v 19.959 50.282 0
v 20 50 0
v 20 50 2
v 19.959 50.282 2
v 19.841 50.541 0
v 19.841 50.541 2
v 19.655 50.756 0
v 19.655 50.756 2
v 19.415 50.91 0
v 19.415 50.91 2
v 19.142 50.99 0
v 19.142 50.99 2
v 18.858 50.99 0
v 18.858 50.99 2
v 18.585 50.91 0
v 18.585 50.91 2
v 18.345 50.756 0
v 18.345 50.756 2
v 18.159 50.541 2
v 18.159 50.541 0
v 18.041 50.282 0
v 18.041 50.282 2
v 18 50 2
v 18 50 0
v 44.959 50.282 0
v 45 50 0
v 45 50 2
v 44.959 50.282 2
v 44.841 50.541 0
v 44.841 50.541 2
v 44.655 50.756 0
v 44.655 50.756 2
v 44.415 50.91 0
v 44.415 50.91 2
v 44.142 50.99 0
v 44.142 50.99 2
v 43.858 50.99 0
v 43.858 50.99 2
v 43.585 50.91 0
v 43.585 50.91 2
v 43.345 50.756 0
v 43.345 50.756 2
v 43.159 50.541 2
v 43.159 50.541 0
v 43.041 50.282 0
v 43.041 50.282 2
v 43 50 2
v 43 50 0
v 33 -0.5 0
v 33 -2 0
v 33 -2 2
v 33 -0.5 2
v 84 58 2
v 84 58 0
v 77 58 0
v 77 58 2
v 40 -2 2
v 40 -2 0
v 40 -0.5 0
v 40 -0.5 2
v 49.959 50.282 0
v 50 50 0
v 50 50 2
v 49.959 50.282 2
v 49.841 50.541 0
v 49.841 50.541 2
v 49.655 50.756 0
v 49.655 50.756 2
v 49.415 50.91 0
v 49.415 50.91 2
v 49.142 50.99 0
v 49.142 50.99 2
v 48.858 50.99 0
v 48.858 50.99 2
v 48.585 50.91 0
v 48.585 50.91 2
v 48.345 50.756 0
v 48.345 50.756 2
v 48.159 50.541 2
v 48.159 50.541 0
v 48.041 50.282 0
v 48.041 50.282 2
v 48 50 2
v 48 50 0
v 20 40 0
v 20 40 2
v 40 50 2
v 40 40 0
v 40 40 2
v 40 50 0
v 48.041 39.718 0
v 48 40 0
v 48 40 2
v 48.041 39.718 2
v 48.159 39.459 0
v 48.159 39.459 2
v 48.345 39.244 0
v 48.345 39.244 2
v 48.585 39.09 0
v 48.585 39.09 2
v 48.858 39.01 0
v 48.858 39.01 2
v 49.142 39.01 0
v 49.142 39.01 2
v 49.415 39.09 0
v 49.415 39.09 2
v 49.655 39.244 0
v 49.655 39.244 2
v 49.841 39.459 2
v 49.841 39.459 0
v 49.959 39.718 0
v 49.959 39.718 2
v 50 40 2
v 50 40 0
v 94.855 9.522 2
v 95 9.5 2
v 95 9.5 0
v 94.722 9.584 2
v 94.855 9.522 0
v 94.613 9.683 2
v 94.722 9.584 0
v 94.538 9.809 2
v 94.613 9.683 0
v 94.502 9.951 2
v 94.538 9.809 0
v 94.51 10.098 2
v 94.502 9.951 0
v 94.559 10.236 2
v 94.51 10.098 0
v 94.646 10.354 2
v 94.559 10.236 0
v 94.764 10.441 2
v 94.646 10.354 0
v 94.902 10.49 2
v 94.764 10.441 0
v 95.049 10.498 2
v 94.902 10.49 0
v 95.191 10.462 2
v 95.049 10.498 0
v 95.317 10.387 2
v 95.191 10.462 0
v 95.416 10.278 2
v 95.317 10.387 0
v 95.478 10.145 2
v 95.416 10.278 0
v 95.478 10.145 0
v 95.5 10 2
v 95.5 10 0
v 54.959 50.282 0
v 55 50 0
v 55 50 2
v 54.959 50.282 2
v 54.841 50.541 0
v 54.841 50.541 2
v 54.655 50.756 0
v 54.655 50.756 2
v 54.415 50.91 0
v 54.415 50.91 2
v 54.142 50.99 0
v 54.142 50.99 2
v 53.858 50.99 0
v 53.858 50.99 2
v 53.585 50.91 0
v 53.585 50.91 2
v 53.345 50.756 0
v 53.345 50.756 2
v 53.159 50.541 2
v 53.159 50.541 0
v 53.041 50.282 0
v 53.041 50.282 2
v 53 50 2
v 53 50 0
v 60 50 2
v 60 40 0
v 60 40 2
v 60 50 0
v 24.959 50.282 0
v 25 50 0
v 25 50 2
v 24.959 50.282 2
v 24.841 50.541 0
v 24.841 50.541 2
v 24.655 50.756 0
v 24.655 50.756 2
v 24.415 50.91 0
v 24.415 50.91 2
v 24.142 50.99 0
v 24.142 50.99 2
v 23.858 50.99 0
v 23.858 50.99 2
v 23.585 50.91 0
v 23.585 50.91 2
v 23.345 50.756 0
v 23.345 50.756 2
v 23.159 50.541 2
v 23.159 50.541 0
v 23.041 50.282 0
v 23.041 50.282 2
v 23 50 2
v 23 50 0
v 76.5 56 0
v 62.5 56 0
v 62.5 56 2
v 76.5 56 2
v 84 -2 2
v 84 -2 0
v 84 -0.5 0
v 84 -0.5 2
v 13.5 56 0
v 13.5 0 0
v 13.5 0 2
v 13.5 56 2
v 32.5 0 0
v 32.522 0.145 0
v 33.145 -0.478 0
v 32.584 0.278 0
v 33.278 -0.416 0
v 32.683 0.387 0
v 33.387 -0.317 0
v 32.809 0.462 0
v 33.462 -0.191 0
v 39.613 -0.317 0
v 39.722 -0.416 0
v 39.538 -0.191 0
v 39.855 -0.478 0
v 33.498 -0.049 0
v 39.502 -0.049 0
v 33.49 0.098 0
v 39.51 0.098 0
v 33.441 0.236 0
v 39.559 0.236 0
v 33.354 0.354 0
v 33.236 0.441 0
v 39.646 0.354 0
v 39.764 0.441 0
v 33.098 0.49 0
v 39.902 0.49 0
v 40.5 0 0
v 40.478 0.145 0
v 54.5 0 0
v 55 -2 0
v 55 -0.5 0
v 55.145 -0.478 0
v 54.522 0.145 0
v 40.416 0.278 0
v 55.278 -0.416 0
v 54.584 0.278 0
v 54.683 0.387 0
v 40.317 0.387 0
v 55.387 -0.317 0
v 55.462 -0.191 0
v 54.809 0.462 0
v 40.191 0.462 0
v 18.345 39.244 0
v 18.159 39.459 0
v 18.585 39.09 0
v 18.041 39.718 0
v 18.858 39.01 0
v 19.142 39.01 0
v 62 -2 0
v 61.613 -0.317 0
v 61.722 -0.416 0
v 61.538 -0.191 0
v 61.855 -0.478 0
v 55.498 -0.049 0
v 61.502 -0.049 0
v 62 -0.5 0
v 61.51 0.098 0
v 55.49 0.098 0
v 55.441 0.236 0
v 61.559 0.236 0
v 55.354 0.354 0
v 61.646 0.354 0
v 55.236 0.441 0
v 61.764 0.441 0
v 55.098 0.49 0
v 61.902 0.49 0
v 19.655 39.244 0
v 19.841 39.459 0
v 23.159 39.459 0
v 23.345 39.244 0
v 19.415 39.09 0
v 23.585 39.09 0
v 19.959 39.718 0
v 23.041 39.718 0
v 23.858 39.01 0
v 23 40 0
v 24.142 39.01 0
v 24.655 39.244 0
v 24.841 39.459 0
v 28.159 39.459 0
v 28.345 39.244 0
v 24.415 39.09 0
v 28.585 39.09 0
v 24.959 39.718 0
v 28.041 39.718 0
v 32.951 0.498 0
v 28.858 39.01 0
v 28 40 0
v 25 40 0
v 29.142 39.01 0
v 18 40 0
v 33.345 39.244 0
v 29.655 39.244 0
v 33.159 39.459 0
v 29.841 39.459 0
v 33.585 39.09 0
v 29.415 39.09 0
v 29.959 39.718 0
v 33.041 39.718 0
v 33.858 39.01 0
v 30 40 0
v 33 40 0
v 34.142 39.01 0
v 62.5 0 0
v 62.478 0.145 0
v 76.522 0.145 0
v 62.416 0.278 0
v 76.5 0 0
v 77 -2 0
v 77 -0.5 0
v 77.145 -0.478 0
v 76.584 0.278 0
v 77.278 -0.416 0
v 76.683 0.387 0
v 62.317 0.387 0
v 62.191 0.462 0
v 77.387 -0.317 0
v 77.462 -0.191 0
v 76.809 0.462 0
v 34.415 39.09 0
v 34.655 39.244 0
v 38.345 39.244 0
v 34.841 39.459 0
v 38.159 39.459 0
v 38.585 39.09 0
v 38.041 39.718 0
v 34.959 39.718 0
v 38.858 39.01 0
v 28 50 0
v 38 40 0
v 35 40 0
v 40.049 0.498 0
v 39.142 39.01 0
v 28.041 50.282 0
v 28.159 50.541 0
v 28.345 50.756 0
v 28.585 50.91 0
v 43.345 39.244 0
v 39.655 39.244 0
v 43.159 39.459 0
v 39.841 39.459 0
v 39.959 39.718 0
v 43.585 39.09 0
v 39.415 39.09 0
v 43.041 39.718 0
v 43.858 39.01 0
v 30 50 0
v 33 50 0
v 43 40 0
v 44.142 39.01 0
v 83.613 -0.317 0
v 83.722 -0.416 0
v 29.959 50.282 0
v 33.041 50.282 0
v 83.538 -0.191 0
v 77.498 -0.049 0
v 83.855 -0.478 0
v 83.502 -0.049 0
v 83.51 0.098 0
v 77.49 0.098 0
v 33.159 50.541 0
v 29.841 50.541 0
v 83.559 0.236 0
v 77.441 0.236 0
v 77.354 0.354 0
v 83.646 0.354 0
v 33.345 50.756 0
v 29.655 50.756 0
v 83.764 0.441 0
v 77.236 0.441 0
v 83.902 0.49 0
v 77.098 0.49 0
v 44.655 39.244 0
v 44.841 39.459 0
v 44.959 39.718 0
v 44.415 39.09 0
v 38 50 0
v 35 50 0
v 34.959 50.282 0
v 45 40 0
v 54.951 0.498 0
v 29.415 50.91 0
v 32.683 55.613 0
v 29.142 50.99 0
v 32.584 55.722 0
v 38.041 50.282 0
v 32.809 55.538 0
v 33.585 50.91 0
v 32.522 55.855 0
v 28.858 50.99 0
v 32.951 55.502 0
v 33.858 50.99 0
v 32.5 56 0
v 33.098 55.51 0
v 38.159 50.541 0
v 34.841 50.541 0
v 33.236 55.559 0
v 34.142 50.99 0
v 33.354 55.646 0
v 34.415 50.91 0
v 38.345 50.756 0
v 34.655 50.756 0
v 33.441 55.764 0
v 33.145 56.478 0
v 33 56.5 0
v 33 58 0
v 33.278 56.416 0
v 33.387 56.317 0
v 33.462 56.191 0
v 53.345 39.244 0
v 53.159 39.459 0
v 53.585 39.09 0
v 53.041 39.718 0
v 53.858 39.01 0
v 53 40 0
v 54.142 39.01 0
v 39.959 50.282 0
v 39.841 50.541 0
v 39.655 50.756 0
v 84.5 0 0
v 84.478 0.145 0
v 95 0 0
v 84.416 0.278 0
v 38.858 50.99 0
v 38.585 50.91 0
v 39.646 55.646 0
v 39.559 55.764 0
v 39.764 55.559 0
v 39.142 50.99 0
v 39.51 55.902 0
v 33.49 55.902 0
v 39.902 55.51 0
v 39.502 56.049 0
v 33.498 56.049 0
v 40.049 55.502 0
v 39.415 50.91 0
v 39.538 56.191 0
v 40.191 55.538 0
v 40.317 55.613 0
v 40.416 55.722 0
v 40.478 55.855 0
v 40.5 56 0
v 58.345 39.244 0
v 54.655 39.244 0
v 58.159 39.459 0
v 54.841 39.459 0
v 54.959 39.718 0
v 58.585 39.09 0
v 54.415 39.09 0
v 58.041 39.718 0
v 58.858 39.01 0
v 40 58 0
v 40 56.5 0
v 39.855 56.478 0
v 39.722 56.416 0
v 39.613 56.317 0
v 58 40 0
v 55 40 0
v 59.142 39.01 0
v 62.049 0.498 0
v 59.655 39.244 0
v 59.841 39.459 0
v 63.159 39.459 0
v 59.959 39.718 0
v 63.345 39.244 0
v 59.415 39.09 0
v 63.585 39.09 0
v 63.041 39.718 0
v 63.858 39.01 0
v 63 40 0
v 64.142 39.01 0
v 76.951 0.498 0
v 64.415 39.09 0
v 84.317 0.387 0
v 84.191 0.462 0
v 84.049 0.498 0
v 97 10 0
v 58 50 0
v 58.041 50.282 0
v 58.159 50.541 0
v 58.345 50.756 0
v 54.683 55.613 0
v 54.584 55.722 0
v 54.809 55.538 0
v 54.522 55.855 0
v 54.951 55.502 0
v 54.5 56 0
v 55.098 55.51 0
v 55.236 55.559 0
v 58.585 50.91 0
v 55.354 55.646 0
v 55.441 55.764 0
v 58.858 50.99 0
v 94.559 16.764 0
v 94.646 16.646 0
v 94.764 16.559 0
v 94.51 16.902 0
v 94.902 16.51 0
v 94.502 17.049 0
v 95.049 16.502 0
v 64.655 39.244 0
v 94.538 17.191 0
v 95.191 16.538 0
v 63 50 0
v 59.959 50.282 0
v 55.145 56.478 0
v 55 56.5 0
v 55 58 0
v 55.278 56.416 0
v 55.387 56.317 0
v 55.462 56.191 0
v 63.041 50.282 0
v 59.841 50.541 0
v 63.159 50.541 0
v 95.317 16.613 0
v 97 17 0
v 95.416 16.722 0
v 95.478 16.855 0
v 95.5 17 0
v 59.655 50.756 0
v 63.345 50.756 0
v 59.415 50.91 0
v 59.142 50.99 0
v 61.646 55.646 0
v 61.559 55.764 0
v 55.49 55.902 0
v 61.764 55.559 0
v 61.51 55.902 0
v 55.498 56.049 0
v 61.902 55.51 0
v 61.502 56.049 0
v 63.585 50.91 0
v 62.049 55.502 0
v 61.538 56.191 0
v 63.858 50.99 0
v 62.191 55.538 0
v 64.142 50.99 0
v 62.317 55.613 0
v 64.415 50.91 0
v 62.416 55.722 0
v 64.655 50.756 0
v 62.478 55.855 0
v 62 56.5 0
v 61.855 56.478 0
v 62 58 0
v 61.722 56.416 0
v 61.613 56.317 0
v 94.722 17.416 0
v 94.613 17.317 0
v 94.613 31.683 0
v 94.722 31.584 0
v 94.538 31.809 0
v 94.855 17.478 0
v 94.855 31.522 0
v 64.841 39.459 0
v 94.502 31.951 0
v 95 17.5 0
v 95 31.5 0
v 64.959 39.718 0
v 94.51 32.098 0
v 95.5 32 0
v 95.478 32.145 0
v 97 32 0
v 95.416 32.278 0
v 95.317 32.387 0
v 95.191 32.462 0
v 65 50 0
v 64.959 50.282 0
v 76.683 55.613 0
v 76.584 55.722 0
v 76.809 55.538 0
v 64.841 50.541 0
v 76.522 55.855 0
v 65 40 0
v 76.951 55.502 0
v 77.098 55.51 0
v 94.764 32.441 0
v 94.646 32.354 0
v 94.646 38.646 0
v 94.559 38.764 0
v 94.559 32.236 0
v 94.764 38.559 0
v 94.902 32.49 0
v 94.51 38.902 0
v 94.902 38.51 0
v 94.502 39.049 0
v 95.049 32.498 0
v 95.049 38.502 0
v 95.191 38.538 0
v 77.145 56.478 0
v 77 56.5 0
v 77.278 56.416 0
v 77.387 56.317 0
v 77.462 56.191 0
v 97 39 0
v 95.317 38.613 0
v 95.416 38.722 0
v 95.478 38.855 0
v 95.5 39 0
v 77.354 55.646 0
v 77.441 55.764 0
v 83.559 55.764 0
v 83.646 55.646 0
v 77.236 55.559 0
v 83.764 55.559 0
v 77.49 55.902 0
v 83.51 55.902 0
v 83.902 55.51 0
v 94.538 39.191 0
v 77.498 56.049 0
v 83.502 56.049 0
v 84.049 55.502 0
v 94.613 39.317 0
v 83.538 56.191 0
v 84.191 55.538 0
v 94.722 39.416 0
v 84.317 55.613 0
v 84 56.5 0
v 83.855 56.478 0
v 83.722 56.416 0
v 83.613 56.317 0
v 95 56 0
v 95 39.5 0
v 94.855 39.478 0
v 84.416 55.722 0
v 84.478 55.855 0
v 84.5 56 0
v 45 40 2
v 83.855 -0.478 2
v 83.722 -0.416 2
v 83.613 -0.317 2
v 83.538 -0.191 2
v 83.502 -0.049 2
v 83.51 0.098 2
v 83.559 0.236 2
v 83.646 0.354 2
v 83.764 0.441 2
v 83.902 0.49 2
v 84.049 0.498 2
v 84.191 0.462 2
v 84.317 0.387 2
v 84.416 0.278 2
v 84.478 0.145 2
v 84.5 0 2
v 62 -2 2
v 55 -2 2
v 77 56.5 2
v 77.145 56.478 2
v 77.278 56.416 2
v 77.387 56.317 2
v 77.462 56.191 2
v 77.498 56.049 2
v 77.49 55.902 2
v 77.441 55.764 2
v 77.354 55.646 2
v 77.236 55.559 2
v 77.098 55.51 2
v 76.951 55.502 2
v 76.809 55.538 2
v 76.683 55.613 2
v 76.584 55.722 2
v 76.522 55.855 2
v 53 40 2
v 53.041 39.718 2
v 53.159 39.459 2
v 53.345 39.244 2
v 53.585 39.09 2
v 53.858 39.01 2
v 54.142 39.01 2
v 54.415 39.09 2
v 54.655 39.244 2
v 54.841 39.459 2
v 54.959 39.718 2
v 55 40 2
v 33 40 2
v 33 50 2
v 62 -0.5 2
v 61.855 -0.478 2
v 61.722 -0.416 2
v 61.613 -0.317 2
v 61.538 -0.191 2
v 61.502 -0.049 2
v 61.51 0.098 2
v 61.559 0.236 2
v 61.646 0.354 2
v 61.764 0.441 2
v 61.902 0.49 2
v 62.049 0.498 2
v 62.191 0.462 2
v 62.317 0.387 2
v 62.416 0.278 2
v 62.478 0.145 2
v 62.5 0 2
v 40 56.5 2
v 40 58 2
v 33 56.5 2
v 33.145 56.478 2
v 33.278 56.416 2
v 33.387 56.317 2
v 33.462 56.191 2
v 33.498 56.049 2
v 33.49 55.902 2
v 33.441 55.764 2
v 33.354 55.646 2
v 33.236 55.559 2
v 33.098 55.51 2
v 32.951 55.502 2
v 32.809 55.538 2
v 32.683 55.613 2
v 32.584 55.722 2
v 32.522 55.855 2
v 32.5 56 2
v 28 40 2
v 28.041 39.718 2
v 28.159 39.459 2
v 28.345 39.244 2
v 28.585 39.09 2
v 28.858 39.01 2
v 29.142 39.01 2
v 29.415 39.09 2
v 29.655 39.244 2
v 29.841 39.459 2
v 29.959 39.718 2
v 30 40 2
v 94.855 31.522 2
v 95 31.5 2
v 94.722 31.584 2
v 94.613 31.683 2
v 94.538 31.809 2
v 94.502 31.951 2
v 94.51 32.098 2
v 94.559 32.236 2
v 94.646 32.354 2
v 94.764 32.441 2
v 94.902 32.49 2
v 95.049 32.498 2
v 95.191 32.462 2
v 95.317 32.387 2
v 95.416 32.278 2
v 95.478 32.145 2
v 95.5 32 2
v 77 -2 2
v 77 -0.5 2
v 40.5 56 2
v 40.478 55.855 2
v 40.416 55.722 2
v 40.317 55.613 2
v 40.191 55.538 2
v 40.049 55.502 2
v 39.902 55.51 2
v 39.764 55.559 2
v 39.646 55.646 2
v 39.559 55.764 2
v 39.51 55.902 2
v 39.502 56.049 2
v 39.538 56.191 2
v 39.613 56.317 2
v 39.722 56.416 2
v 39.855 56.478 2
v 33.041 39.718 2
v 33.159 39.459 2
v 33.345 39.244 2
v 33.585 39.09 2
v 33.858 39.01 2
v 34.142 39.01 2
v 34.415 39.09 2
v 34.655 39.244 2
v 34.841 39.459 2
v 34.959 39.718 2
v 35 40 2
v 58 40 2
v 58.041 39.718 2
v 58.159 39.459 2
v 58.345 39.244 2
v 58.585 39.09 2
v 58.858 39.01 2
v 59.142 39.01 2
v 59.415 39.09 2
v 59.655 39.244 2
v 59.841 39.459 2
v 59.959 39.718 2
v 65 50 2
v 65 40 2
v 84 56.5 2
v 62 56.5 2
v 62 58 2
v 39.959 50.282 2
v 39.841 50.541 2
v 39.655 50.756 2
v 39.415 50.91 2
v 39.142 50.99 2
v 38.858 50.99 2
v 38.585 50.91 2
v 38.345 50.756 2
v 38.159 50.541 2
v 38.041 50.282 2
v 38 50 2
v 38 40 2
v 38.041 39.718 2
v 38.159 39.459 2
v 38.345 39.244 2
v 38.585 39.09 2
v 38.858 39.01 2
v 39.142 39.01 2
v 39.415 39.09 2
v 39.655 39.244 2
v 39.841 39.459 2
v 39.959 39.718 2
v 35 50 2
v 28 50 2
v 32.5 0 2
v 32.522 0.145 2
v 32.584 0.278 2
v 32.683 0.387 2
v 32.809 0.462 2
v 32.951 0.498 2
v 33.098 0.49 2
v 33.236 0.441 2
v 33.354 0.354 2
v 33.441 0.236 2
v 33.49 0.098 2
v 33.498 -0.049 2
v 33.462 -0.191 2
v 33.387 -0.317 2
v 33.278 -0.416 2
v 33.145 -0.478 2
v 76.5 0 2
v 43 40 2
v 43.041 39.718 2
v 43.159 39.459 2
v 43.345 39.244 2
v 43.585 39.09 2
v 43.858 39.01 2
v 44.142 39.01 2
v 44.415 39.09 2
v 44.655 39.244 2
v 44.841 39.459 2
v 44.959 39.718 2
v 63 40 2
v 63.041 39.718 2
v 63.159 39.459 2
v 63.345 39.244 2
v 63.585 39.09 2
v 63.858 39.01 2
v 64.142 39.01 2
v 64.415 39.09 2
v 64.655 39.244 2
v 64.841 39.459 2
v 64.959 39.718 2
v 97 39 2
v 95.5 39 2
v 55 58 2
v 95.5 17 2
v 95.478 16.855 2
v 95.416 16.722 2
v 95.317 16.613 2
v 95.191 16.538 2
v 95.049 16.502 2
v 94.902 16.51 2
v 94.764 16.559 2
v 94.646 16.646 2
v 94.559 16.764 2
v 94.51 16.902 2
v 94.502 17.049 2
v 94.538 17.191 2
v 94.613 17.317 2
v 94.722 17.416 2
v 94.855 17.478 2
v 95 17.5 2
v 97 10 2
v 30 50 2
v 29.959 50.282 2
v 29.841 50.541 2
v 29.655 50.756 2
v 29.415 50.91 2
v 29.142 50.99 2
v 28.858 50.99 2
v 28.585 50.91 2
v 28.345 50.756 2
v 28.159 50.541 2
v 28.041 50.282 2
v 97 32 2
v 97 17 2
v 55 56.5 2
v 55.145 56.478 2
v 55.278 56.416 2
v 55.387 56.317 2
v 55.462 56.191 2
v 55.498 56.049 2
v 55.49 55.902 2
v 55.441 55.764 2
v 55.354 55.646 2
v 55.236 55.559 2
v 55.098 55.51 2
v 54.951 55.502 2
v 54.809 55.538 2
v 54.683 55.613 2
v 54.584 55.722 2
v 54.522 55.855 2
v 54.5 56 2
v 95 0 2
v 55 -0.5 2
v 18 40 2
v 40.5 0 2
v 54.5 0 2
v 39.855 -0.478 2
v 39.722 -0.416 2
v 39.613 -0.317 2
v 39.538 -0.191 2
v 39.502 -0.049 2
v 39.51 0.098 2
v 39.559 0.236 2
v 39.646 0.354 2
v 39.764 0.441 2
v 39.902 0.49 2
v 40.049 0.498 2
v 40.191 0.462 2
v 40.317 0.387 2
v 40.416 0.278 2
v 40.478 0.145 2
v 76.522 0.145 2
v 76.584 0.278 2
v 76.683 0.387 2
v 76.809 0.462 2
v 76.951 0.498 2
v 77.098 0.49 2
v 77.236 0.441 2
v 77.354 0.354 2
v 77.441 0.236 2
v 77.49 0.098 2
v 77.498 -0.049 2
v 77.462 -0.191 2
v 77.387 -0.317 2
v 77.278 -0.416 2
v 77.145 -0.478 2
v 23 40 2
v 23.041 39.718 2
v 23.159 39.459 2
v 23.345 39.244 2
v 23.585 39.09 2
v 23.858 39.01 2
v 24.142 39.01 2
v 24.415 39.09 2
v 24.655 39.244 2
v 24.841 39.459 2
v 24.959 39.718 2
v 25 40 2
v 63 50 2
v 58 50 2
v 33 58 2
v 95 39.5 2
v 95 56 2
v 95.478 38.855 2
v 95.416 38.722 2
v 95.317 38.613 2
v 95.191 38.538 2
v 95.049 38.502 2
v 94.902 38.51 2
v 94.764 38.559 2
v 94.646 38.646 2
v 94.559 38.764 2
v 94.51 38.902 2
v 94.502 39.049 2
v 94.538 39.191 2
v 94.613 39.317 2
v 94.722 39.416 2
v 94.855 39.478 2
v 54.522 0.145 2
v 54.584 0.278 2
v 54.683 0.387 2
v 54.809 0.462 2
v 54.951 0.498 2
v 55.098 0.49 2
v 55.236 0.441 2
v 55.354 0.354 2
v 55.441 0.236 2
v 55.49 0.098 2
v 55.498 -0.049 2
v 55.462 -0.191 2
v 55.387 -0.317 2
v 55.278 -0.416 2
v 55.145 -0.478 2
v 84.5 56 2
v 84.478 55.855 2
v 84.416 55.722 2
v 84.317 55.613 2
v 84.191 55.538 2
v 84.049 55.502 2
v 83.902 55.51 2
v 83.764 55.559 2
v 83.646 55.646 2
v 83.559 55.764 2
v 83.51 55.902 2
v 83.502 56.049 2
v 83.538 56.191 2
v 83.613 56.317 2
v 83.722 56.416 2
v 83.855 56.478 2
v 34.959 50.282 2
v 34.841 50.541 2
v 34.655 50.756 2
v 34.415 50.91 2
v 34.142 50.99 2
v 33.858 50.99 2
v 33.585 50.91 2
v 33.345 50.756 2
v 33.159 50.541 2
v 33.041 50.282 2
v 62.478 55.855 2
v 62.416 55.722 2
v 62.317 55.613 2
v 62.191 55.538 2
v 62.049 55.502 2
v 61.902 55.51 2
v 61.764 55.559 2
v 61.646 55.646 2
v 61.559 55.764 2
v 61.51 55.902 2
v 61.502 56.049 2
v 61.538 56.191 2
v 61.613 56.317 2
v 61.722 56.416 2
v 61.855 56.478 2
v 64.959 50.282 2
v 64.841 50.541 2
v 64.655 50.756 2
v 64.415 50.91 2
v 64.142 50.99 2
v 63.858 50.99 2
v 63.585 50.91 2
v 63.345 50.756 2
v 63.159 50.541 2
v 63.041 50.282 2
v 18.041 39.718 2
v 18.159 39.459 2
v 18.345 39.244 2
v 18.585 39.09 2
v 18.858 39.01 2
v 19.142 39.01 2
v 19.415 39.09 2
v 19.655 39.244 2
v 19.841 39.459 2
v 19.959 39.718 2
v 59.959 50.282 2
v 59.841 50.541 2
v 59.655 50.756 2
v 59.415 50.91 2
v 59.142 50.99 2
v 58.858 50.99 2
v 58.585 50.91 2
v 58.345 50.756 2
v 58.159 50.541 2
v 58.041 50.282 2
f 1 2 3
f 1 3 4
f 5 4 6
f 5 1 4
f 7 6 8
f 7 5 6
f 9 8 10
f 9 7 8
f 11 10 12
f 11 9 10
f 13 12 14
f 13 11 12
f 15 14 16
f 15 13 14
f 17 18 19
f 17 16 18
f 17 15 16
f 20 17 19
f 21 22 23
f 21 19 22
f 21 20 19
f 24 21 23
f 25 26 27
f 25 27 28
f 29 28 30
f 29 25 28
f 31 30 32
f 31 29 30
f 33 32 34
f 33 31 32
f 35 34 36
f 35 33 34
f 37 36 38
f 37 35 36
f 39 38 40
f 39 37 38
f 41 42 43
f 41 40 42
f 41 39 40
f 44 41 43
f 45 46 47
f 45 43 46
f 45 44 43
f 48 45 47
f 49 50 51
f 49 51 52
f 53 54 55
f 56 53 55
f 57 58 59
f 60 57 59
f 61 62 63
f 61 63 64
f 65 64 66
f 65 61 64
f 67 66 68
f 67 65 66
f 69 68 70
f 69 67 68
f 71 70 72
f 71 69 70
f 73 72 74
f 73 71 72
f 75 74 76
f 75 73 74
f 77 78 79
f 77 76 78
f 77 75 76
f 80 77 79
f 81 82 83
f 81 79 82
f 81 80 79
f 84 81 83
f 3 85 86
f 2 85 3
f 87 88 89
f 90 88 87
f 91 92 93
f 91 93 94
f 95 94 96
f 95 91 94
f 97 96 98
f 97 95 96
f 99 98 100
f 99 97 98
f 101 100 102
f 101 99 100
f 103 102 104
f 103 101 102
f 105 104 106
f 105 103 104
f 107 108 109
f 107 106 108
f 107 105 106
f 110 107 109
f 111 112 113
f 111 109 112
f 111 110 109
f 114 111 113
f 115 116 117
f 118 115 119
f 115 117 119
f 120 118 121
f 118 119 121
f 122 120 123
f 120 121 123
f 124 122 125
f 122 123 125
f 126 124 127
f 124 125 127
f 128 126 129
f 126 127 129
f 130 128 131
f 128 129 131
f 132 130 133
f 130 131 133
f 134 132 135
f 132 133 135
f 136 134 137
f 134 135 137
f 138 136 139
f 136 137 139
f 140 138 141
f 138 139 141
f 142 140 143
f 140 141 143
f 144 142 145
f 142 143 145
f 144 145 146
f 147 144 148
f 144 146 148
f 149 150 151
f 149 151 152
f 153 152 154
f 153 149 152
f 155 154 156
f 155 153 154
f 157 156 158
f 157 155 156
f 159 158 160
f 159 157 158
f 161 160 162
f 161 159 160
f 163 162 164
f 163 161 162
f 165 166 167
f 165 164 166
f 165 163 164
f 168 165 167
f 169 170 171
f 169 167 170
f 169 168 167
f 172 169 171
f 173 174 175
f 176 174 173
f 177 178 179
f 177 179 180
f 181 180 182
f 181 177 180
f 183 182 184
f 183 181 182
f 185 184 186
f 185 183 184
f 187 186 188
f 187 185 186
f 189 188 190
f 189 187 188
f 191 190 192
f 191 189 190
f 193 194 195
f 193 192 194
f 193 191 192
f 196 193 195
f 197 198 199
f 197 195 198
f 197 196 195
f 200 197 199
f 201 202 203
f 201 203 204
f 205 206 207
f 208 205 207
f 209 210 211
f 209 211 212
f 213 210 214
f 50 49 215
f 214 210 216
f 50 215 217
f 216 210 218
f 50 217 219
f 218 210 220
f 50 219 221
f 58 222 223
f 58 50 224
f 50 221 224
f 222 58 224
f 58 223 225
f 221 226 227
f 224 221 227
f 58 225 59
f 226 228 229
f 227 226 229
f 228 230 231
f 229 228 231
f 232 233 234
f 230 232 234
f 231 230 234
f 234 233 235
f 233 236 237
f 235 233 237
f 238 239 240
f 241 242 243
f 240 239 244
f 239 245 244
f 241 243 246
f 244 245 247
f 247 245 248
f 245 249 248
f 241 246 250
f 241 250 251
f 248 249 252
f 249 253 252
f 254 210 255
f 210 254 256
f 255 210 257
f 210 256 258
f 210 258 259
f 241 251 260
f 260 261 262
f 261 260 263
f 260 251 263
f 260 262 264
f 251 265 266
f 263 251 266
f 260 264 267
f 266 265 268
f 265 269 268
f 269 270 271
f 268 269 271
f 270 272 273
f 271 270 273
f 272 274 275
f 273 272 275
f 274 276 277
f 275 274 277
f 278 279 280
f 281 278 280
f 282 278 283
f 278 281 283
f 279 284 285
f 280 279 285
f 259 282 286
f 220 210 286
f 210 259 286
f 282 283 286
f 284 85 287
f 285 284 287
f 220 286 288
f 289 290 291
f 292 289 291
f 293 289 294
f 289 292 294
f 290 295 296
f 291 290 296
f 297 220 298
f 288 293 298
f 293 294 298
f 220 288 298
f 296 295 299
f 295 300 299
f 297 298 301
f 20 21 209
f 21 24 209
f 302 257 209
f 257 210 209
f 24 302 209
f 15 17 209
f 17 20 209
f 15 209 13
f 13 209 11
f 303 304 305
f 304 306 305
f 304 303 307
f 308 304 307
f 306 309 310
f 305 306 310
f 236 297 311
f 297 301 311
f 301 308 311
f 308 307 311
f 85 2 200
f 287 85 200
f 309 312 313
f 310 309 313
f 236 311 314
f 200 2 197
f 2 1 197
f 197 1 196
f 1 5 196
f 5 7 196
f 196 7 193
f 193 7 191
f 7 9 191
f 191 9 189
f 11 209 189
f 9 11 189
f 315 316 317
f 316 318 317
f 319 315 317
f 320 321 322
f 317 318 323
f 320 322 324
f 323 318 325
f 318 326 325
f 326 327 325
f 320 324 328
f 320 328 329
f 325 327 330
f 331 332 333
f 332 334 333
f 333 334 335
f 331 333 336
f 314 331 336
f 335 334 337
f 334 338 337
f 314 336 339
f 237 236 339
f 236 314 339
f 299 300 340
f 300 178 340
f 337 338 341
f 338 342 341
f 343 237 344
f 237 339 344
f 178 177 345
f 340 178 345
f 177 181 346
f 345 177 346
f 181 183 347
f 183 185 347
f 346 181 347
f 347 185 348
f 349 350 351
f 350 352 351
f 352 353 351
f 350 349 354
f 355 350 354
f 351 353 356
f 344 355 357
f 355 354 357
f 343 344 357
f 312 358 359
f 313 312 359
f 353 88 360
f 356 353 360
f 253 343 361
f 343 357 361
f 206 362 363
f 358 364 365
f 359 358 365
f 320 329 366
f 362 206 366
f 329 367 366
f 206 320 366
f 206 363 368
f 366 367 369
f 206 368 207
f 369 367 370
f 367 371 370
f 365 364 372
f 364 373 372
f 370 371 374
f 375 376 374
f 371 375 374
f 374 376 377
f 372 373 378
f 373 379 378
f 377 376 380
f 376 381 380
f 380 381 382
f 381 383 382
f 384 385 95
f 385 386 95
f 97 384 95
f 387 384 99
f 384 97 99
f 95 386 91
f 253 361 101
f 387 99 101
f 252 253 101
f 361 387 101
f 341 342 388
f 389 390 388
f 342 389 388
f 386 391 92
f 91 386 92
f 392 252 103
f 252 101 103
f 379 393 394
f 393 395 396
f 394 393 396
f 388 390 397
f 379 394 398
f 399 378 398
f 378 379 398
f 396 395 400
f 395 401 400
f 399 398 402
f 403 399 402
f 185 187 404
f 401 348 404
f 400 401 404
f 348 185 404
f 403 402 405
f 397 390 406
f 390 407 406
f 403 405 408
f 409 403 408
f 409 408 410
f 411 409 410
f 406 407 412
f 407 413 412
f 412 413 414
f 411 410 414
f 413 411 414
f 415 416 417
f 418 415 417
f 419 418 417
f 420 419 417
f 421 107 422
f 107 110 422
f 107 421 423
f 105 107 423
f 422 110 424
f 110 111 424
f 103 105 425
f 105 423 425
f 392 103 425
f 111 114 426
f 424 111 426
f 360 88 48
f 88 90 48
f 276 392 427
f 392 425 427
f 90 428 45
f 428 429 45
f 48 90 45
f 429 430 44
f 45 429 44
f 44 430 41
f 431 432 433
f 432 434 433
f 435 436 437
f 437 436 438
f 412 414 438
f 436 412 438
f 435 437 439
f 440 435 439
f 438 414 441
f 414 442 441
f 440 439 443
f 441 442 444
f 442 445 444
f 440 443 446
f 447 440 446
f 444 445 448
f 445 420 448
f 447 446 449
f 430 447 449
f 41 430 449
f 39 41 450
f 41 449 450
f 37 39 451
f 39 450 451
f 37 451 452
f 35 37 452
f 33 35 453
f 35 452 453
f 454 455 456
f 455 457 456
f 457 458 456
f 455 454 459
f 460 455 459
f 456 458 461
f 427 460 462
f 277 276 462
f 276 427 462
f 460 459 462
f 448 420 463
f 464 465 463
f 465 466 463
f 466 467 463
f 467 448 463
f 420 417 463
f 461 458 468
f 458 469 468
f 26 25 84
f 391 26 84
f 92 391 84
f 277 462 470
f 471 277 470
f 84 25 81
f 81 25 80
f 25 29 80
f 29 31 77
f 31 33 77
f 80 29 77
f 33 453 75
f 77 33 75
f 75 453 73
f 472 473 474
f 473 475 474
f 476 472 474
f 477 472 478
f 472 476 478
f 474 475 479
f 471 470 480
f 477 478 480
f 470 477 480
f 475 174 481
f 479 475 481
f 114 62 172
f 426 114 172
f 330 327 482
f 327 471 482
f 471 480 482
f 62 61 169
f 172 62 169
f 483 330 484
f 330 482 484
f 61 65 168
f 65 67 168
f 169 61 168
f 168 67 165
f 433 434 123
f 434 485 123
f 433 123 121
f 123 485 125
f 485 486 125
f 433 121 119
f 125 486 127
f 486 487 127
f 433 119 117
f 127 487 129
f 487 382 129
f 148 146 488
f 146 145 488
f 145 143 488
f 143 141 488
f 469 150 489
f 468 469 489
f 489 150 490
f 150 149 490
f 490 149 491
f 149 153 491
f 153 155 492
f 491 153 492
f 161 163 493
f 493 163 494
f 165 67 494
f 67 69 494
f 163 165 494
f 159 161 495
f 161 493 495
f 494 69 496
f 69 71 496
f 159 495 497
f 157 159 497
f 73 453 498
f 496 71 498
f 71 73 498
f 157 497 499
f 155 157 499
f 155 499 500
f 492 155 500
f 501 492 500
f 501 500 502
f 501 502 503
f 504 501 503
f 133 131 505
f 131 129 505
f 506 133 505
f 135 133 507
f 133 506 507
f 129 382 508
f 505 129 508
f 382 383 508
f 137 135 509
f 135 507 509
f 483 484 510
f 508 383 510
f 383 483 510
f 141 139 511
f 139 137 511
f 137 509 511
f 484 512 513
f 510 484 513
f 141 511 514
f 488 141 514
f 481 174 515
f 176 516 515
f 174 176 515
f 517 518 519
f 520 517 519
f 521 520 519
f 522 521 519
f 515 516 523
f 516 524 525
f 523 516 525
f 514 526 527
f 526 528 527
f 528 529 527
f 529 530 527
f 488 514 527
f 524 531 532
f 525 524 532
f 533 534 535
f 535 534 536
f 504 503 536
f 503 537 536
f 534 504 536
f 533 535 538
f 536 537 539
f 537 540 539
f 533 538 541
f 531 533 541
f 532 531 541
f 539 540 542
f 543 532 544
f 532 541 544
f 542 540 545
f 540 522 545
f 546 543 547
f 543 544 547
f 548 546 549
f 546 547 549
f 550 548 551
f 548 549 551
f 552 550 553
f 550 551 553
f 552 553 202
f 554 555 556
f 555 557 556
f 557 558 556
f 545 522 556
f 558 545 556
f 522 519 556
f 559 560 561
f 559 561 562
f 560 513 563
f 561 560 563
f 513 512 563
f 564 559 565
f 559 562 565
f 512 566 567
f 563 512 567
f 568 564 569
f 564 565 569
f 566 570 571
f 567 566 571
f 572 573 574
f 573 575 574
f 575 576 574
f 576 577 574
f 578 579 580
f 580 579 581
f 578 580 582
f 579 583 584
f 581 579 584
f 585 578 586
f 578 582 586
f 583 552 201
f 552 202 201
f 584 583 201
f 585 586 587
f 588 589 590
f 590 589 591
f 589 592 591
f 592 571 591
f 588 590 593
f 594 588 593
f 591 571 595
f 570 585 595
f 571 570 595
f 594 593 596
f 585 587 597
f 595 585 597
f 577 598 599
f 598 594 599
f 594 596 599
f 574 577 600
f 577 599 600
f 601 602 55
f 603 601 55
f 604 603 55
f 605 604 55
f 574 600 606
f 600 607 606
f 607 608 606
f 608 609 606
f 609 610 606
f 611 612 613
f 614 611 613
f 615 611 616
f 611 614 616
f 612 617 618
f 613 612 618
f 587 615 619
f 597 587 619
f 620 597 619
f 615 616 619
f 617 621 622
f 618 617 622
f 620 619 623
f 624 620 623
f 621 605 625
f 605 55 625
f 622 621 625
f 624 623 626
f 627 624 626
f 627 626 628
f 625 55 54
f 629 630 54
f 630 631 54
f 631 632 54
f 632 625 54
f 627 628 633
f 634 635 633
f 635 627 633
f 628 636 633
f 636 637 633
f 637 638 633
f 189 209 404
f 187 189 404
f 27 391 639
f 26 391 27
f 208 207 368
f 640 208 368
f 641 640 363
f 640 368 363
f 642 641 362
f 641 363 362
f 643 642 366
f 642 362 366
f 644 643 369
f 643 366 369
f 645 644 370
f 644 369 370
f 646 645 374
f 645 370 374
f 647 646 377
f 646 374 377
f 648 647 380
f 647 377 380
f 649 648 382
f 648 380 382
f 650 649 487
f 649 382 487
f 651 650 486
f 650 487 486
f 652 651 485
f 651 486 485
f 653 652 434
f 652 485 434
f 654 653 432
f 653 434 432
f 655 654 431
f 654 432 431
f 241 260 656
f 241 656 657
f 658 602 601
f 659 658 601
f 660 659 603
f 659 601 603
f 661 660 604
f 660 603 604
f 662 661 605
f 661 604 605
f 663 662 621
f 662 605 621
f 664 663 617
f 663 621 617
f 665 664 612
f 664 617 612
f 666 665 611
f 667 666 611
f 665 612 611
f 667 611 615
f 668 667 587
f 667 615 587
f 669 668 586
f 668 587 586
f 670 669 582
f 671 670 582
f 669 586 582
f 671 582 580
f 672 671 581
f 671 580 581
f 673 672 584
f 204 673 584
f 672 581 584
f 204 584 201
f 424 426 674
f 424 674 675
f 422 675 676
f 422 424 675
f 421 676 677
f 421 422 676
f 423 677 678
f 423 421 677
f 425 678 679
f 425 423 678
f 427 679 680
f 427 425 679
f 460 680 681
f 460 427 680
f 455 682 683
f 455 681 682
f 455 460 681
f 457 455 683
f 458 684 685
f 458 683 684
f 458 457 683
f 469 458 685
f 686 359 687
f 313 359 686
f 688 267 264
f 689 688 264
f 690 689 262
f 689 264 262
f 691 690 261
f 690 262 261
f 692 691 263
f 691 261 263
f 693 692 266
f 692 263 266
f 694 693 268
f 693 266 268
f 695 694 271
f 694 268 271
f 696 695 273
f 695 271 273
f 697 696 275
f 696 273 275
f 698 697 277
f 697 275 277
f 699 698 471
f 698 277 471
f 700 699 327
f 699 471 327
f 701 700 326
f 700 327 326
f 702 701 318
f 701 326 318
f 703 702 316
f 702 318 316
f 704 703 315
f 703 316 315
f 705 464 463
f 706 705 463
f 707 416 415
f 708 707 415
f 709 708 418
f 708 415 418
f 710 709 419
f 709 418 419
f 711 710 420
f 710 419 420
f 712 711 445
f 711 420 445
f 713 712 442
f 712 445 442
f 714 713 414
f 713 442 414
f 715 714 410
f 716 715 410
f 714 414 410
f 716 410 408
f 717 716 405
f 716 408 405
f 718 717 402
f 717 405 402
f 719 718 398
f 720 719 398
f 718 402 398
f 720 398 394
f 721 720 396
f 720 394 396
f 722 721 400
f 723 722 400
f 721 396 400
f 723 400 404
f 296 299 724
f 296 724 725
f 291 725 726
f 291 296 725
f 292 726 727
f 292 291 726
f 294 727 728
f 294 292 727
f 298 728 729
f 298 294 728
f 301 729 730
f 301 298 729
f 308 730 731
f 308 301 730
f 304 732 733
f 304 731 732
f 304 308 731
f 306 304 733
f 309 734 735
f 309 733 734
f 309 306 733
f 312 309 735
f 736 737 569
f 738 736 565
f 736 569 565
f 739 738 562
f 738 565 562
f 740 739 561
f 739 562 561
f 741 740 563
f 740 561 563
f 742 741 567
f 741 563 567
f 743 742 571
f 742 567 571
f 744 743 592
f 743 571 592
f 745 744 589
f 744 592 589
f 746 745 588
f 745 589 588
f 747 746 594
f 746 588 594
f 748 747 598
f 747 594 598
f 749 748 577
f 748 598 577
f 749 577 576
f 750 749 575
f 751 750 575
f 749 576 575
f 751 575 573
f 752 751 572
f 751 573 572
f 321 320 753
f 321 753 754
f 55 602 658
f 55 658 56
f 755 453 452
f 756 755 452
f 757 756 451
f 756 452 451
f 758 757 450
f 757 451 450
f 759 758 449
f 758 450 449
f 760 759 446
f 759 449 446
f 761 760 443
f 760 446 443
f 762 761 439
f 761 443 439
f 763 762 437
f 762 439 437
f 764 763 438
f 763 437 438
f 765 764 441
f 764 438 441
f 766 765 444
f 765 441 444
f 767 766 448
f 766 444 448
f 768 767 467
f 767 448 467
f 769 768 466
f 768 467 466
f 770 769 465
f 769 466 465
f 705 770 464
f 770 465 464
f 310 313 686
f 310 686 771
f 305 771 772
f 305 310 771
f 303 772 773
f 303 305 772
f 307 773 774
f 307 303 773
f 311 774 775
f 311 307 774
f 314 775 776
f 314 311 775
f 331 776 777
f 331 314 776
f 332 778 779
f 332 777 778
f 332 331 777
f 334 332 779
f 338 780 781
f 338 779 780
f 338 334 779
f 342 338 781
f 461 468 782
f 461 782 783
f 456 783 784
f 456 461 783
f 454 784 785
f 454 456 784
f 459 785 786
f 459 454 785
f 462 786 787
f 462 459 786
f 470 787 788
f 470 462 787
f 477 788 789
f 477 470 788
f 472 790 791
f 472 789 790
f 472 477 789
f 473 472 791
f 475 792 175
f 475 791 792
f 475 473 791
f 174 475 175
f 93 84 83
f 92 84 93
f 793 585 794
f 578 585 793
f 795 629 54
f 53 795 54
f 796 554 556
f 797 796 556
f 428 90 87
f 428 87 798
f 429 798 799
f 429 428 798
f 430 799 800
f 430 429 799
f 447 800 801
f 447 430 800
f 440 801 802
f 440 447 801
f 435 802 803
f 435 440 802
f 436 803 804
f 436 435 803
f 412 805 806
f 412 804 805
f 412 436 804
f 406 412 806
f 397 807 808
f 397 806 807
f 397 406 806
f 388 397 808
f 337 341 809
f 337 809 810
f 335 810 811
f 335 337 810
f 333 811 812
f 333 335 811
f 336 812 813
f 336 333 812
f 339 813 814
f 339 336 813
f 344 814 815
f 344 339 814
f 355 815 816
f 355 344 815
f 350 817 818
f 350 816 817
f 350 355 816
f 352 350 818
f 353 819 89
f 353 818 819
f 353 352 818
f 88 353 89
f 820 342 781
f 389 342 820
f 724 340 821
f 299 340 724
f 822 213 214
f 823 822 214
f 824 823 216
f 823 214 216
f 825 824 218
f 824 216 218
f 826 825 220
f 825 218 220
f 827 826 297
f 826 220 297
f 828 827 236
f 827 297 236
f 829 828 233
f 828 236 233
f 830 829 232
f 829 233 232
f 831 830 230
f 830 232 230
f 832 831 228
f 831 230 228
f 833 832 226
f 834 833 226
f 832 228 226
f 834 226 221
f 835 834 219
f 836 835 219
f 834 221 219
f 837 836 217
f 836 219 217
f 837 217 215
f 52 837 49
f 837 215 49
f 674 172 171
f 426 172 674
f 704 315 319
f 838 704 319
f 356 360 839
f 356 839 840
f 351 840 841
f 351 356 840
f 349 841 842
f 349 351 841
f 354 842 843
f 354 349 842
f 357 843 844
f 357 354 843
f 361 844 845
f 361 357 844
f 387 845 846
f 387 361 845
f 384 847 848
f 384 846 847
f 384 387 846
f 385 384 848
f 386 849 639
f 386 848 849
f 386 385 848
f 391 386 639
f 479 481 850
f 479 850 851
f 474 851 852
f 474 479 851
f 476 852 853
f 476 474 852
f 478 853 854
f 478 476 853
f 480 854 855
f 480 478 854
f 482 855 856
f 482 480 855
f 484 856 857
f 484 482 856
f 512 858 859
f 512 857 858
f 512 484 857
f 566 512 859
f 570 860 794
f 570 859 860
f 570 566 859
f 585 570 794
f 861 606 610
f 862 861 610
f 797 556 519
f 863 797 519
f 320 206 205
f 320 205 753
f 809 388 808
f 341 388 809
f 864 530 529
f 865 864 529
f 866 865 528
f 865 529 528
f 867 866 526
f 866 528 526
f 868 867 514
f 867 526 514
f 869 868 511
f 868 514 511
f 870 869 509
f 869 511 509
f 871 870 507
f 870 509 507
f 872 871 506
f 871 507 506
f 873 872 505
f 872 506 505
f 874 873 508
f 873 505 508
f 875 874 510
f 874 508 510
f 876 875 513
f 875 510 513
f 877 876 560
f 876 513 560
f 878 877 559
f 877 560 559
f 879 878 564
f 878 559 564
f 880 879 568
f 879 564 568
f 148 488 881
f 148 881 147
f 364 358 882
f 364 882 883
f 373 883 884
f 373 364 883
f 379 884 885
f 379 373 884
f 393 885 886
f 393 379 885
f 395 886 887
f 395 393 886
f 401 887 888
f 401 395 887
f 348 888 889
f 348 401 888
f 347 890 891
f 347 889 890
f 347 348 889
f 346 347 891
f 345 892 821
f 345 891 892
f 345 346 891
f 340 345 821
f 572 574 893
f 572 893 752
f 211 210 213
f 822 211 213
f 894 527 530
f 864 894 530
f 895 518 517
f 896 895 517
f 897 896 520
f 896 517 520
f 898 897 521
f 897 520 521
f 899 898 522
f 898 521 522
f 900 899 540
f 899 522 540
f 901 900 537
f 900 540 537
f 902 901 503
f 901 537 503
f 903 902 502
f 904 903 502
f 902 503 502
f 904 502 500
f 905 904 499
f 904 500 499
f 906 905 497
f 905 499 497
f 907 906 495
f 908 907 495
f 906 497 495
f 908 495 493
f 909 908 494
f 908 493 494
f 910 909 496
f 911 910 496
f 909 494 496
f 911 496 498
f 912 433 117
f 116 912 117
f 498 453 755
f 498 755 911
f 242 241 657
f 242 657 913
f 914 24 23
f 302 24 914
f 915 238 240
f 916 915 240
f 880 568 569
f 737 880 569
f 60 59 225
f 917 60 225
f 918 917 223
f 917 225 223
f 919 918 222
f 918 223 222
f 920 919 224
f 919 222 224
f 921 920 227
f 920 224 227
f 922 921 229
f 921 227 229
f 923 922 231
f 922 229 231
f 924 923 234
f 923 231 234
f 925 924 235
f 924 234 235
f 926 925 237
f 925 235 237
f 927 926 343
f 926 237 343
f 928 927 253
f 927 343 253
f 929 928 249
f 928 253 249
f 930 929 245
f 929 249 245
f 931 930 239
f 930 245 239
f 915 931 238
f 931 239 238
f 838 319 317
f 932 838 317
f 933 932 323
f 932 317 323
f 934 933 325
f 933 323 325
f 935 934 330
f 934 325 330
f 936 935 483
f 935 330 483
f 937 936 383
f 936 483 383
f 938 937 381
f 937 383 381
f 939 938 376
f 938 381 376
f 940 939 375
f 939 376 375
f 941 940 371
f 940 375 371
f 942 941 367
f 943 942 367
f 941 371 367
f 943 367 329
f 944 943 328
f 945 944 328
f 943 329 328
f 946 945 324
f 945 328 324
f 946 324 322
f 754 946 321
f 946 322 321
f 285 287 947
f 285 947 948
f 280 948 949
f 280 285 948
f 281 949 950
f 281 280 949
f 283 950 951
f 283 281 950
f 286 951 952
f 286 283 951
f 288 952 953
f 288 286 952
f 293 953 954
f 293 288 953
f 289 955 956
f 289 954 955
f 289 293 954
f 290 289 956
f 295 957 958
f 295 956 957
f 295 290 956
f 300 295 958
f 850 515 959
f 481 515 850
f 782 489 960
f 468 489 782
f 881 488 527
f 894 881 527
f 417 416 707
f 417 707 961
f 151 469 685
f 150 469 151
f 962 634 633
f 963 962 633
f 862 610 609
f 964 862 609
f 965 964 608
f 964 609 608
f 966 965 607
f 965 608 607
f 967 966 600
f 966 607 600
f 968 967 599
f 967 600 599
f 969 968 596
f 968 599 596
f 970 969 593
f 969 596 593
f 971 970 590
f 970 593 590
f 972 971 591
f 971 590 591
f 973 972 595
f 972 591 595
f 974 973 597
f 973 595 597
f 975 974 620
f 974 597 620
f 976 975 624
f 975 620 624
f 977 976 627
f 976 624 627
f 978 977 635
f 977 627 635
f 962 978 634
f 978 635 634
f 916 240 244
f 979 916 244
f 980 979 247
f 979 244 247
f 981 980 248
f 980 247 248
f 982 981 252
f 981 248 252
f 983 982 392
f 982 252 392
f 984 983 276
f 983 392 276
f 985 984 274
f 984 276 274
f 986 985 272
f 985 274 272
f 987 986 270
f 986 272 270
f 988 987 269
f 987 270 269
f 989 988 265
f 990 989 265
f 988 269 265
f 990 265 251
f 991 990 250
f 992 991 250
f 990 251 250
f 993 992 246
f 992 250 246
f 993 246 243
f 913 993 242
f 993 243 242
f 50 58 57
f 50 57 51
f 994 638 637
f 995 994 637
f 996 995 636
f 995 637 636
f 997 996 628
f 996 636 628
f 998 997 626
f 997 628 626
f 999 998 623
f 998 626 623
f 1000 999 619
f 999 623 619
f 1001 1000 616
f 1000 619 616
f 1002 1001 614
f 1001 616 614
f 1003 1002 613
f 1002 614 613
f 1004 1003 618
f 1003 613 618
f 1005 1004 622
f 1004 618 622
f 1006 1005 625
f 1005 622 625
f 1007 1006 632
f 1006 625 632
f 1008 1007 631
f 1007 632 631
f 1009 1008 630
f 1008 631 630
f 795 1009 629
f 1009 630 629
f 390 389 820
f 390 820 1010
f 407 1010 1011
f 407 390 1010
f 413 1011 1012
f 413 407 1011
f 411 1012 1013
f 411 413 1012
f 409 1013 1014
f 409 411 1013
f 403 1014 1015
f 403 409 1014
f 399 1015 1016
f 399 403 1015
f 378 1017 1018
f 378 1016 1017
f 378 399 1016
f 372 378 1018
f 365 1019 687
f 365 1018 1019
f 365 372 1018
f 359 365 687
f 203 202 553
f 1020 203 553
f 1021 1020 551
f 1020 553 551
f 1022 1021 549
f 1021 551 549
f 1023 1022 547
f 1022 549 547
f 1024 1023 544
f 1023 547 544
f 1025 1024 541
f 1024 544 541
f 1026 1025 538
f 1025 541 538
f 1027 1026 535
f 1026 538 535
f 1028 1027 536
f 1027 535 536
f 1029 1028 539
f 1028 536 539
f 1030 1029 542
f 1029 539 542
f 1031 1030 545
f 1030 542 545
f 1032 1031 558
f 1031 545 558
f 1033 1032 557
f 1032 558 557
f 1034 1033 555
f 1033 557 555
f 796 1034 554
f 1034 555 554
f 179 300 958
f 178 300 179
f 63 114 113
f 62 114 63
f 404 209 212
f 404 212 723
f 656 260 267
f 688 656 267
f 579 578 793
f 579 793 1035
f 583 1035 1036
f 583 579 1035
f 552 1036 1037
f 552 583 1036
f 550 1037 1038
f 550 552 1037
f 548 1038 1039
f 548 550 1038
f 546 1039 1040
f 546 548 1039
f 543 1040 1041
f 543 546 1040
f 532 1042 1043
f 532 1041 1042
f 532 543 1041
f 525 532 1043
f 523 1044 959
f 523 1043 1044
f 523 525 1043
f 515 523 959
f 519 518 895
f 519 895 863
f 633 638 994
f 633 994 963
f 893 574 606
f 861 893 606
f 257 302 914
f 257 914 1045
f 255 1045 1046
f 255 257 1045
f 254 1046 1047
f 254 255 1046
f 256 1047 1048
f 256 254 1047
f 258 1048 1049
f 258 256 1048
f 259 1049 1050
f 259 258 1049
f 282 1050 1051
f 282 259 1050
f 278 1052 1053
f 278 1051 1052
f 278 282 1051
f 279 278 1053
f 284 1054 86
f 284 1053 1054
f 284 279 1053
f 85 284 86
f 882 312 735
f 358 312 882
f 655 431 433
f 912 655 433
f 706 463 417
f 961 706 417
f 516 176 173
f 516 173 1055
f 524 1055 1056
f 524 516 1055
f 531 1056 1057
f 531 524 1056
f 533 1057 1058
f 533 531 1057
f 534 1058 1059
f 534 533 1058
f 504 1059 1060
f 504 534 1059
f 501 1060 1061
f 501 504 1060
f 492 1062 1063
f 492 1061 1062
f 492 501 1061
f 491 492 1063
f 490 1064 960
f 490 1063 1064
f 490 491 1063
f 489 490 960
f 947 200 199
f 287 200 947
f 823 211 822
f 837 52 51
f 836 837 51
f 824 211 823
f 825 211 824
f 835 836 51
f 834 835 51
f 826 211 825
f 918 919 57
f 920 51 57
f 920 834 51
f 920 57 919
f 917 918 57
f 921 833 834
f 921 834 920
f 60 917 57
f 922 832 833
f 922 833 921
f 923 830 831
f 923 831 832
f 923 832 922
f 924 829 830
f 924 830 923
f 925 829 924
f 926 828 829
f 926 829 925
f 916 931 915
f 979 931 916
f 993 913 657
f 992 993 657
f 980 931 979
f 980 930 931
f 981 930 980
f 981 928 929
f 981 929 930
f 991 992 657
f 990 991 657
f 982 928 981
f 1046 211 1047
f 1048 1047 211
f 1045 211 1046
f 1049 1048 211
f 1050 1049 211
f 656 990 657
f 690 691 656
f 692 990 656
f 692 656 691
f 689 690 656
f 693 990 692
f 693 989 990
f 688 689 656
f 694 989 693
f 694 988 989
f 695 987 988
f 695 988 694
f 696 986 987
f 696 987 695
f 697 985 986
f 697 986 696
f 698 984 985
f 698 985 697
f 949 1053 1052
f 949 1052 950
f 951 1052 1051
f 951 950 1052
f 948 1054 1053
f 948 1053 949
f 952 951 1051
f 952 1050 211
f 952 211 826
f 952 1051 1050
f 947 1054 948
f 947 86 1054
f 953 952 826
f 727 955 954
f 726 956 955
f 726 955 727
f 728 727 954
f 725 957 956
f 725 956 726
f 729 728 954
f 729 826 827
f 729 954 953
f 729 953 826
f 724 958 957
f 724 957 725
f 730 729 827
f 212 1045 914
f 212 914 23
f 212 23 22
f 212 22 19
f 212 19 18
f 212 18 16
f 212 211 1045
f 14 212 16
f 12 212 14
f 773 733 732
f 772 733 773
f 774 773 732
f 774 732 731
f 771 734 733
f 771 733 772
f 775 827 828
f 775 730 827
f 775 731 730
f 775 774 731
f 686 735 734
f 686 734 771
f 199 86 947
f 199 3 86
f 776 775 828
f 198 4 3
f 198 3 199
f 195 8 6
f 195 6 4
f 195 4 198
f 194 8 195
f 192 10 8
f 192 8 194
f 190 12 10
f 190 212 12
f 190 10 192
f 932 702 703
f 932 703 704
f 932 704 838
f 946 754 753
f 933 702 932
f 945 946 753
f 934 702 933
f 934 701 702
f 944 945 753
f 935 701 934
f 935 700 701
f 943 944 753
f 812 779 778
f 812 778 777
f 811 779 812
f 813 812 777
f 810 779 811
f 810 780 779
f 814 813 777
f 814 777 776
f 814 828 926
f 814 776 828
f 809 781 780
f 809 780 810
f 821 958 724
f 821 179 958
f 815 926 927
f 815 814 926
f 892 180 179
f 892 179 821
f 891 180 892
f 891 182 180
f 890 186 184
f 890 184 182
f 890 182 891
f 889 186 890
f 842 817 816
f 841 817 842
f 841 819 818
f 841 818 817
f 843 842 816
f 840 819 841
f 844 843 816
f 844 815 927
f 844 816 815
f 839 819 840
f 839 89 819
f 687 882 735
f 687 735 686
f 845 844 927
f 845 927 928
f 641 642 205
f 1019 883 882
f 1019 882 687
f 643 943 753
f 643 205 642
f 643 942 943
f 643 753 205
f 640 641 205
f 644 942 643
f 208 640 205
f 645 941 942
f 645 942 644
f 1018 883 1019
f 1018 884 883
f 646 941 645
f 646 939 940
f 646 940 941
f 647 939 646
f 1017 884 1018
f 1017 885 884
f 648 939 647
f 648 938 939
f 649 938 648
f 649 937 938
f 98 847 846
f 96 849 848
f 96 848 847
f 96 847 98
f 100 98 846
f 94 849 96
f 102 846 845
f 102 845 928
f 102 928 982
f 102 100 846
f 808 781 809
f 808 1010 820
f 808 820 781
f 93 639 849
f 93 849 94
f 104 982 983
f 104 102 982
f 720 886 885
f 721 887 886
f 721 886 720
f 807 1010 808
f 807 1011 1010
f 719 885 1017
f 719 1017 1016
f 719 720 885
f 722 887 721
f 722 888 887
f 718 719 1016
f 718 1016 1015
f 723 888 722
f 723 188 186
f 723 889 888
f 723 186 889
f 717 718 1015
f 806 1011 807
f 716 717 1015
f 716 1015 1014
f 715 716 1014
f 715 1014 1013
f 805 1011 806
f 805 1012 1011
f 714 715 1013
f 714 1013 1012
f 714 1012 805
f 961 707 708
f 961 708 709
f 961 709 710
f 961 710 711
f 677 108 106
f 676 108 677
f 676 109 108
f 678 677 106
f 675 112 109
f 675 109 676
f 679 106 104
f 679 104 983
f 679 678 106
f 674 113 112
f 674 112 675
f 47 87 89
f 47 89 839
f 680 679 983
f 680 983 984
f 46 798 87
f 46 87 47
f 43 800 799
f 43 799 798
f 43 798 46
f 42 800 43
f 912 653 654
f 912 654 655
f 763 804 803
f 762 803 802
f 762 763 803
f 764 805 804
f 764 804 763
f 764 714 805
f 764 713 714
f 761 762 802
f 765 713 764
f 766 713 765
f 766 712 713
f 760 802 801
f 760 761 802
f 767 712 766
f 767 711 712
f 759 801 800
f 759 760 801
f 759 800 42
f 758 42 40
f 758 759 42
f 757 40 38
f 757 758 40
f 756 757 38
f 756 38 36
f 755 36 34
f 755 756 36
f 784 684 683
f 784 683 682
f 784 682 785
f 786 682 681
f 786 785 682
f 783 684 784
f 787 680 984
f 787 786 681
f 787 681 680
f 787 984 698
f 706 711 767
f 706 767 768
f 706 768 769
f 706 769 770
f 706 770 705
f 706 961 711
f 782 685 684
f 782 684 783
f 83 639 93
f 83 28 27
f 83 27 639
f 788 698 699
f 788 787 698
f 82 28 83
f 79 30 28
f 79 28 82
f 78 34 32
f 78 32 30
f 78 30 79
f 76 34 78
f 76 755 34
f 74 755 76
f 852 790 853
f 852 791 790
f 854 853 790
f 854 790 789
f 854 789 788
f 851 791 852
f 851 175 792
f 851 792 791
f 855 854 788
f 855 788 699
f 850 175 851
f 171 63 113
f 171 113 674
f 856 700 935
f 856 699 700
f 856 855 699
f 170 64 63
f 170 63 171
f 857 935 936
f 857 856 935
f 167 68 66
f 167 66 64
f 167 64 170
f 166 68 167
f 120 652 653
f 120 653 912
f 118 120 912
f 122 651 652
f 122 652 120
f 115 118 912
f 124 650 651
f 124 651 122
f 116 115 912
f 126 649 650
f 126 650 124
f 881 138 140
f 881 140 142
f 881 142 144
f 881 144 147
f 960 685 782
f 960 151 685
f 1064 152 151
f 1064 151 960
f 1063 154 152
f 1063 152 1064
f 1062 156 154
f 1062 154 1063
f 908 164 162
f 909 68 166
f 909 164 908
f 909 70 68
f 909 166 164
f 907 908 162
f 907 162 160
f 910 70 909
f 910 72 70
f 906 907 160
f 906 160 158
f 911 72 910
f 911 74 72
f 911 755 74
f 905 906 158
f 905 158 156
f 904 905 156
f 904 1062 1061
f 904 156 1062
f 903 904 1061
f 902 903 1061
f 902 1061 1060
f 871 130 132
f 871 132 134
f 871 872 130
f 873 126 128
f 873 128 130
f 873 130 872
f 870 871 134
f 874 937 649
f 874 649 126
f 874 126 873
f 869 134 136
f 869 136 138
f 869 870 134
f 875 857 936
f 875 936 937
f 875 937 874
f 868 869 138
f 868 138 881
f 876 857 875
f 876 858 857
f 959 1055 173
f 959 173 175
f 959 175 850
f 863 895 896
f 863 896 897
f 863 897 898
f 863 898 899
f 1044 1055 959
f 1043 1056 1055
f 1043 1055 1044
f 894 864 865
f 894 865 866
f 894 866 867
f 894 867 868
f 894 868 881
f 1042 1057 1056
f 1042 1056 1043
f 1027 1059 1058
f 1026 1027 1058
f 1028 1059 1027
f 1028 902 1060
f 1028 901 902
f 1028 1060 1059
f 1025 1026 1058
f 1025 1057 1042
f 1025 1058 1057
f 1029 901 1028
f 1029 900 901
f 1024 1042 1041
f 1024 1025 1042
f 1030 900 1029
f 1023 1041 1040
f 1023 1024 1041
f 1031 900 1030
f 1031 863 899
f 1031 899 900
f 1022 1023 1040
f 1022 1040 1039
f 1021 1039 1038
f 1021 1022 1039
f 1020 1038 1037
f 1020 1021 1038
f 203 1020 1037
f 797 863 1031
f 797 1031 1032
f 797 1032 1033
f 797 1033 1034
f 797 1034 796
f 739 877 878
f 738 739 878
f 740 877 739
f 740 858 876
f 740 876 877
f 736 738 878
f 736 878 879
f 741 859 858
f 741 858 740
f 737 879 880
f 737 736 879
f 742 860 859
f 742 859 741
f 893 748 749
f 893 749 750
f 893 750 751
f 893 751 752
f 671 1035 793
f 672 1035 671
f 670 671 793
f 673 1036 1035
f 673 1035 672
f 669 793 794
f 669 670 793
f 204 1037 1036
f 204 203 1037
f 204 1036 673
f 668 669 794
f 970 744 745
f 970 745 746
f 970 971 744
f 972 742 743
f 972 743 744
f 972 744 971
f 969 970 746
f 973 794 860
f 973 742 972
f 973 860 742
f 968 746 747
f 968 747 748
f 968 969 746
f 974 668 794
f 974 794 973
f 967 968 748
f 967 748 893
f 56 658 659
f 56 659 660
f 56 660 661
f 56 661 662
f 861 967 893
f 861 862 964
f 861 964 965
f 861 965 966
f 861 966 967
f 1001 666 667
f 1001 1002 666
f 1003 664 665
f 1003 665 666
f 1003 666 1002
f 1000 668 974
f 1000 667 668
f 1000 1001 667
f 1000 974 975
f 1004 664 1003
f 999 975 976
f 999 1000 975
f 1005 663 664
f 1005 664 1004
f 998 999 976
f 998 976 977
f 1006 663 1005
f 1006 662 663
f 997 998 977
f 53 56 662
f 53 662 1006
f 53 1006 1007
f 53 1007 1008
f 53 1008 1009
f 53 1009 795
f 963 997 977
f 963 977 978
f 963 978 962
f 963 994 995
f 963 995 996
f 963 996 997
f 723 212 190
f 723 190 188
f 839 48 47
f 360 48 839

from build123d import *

# Parameters (mm, degrees)
SKETCH_1_W             = 95
SKETCH_1_H             = 56
EXTRUDE_1_DEPTH        = 2
SKETCH_3_W             = 13.5
SKETCH_3_H             = 56
CUT_EXTRUDE_2_DEPTH    = 111.29505882
CUT_EXTRUDE_4_DEPTH    = 111.29505882
PATTERN_LINEAR_1_COUNT = 10
PATTERN_LINEAR_1_PITCH = 5
SKETCH_10_W            = 7
SKETCH_10_H            = 2
EXTRUDE_2_DEPTH        = 2
SKETCH_11_R            = 0.5
CUT_EXTRUDE_7_DEPTH    = 112.323851892
SKETCH_13_W            = 2
SKETCH_13_H            = 7
EXTRUDE_4_DEPTH        = 2
SKETCH_14_R            = 0.5
CUT_EXTRUDE_8_DEPTH    = 114.035392687


with BuildPart() as part:
    # 草图1 → 凸台-拉伸1 (new body)
    with BuildSketch(Plane.XY):
        with Locations((47.5, 28)):
            Rectangle(SKETCH_1_W, SKETCH_1_H)
    extrude(amount=EXTRUDE_1_DEPTH)

    # 草图3 → 切除-拉伸2 (cut, through all)
    with BuildSketch(Plane(origin=(0, 0, 0), x_dir=(-1, 0, 0), z_dir=(0, 0, -1))):
        with Locations((-6.75, 28)):
            Rectangle(SKETCH_3_W, SKETCH_3_H)
    extrude(amount=-CUT_EXTRUDE_2_DEPTH, mode=Mode.SUBTRACT)

    # 草图6 → 切除-拉伸4 (cut, through all)
    with BuildSketch(Plane(origin=(0, 0, 0), x_dir=(-1, 0, 0), z_dir=(0, 0, -1))):
        with BuildLine():
            Line((-63, 50), (-63, 40))
            ThreePointArc((-63, 40), (-64, 39), (-65, 40))
            Line((-65, 40), (-65, 50))
            ThreePointArc((-65, 50), (-64, 51), (-63, 50))
        make_face()
    cut_extrude_4 = extrude(amount=-CUT_EXTRUDE_4_DEPTH, mode=Mode.SUBTRACT)

    # 阵列(线性)1: 切除-拉伸4 ×10
    with Locations(*[(-i * PATTERN_LINEAR_1_PITCH, 0, 0) for i in range(1, PATTERN_LINEAR_1_COUNT)]):
        add(cut_extrude_4, mode=Mode.SUBTRACT)

    # 草图10 → 凸台-拉伸2 (add)
    with BuildSketch(Plane(origin=(0, 0, 0), x_dir=(-1, 0, 0), z_dir=(0, 0, -1))):
        with Locations((-36.5, 57)):
            Rectangle(SKETCH_10_W, SKETCH_10_H)
        with Locations((-80.5, 57)):
            Rectangle(SKETCH_10_W, SKETCH_10_H)
        with Locations((-58.5, 57)):
            Rectangle(SKETCH_10_W, SKETCH_10_H)
        with Locations((-80.5, -1)):
            Rectangle(SKETCH_10_W, SKETCH_10_H)
        with Locations((-58.5, -1)):
            Rectangle(SKETCH_10_W, SKETCH_10_H)
        with Locations((-36.5, -1)):
            Rectangle(SKETCH_10_W, SKETCH_10_H)
    extrude(amount=-EXTRUDE_2_DEPTH)

    # 草图11 → 切除-拉伸7 (cut, through all)
    with BuildSketch(Plane(origin=(0, 0, 0), x_dir=(-1, 0, 0), z_dir=(0, 0, -1))):
        with Locations((-84, 56)):
            Circle(SKETCH_11_R)
        with Locations((-77, 56)):
            Circle(SKETCH_11_R)
        with Locations((-62, 56)):
            Circle(SKETCH_11_R)
        with Locations((-55, 56)):
            Circle(SKETCH_11_R)
        with Locations((-40, 56)):
            Circle(SKETCH_11_R)
        with Locations((-33, 56)):
            Circle(SKETCH_11_R)
        with Locations((-84, 0)):
            Circle(SKETCH_11_R)
        with Locations((-77, 0)):
            Circle(SKETCH_11_R)
        with Locations((-62, 0)):
            Circle(SKETCH_11_R)
        with Locations((-55, 0)):
            Circle(SKETCH_11_R)
        with Locations((-40, 0)):
            Circle(SKETCH_11_R)
        with Locations((-33, 0)):
            Circle(SKETCH_11_R)
    extrude(amount=-CUT_EXTRUDE_7_DEPTH, mode=Mode.SUBTRACT)

    # 草图13 → 凸台-拉伸4 (add)
    with BuildSketch(Plane(origin=(0, 0, 0), x_dir=(-1, 0, 0), z_dir=(0, 0, -1))):
        with Locations((-96, 13.5)):
            Rectangle(SKETCH_13_W, SKETCH_13_H)
        with Locations((-96, 35.5)):
            Rectangle(SKETCH_13_W, SKETCH_13_H)
    extrude(amount=-EXTRUDE_4_DEPTH)

    # 草图14 → 切除-拉伸8 (cut, through all)
    with BuildSketch(Plane(origin=(0, 0, 0), x_dir=(-1, 0, 0), z_dir=(0, 0, -1))):
        with Locations((-95, 39)):
            Circle(SKETCH_14_R)
        with Locations((-95, 32)):
            Circle(SKETCH_14_R)
        with Locations((-95, 17)):
            Circle(SKETCH_14_R)
        with Locations((-95, 10)):
            Circle(SKETCH_14_R)
    extrude(amount=-CUT_EXTRUDE_8_DEPTH, mode=Mode.SUBTRACT)


solid = part.part
